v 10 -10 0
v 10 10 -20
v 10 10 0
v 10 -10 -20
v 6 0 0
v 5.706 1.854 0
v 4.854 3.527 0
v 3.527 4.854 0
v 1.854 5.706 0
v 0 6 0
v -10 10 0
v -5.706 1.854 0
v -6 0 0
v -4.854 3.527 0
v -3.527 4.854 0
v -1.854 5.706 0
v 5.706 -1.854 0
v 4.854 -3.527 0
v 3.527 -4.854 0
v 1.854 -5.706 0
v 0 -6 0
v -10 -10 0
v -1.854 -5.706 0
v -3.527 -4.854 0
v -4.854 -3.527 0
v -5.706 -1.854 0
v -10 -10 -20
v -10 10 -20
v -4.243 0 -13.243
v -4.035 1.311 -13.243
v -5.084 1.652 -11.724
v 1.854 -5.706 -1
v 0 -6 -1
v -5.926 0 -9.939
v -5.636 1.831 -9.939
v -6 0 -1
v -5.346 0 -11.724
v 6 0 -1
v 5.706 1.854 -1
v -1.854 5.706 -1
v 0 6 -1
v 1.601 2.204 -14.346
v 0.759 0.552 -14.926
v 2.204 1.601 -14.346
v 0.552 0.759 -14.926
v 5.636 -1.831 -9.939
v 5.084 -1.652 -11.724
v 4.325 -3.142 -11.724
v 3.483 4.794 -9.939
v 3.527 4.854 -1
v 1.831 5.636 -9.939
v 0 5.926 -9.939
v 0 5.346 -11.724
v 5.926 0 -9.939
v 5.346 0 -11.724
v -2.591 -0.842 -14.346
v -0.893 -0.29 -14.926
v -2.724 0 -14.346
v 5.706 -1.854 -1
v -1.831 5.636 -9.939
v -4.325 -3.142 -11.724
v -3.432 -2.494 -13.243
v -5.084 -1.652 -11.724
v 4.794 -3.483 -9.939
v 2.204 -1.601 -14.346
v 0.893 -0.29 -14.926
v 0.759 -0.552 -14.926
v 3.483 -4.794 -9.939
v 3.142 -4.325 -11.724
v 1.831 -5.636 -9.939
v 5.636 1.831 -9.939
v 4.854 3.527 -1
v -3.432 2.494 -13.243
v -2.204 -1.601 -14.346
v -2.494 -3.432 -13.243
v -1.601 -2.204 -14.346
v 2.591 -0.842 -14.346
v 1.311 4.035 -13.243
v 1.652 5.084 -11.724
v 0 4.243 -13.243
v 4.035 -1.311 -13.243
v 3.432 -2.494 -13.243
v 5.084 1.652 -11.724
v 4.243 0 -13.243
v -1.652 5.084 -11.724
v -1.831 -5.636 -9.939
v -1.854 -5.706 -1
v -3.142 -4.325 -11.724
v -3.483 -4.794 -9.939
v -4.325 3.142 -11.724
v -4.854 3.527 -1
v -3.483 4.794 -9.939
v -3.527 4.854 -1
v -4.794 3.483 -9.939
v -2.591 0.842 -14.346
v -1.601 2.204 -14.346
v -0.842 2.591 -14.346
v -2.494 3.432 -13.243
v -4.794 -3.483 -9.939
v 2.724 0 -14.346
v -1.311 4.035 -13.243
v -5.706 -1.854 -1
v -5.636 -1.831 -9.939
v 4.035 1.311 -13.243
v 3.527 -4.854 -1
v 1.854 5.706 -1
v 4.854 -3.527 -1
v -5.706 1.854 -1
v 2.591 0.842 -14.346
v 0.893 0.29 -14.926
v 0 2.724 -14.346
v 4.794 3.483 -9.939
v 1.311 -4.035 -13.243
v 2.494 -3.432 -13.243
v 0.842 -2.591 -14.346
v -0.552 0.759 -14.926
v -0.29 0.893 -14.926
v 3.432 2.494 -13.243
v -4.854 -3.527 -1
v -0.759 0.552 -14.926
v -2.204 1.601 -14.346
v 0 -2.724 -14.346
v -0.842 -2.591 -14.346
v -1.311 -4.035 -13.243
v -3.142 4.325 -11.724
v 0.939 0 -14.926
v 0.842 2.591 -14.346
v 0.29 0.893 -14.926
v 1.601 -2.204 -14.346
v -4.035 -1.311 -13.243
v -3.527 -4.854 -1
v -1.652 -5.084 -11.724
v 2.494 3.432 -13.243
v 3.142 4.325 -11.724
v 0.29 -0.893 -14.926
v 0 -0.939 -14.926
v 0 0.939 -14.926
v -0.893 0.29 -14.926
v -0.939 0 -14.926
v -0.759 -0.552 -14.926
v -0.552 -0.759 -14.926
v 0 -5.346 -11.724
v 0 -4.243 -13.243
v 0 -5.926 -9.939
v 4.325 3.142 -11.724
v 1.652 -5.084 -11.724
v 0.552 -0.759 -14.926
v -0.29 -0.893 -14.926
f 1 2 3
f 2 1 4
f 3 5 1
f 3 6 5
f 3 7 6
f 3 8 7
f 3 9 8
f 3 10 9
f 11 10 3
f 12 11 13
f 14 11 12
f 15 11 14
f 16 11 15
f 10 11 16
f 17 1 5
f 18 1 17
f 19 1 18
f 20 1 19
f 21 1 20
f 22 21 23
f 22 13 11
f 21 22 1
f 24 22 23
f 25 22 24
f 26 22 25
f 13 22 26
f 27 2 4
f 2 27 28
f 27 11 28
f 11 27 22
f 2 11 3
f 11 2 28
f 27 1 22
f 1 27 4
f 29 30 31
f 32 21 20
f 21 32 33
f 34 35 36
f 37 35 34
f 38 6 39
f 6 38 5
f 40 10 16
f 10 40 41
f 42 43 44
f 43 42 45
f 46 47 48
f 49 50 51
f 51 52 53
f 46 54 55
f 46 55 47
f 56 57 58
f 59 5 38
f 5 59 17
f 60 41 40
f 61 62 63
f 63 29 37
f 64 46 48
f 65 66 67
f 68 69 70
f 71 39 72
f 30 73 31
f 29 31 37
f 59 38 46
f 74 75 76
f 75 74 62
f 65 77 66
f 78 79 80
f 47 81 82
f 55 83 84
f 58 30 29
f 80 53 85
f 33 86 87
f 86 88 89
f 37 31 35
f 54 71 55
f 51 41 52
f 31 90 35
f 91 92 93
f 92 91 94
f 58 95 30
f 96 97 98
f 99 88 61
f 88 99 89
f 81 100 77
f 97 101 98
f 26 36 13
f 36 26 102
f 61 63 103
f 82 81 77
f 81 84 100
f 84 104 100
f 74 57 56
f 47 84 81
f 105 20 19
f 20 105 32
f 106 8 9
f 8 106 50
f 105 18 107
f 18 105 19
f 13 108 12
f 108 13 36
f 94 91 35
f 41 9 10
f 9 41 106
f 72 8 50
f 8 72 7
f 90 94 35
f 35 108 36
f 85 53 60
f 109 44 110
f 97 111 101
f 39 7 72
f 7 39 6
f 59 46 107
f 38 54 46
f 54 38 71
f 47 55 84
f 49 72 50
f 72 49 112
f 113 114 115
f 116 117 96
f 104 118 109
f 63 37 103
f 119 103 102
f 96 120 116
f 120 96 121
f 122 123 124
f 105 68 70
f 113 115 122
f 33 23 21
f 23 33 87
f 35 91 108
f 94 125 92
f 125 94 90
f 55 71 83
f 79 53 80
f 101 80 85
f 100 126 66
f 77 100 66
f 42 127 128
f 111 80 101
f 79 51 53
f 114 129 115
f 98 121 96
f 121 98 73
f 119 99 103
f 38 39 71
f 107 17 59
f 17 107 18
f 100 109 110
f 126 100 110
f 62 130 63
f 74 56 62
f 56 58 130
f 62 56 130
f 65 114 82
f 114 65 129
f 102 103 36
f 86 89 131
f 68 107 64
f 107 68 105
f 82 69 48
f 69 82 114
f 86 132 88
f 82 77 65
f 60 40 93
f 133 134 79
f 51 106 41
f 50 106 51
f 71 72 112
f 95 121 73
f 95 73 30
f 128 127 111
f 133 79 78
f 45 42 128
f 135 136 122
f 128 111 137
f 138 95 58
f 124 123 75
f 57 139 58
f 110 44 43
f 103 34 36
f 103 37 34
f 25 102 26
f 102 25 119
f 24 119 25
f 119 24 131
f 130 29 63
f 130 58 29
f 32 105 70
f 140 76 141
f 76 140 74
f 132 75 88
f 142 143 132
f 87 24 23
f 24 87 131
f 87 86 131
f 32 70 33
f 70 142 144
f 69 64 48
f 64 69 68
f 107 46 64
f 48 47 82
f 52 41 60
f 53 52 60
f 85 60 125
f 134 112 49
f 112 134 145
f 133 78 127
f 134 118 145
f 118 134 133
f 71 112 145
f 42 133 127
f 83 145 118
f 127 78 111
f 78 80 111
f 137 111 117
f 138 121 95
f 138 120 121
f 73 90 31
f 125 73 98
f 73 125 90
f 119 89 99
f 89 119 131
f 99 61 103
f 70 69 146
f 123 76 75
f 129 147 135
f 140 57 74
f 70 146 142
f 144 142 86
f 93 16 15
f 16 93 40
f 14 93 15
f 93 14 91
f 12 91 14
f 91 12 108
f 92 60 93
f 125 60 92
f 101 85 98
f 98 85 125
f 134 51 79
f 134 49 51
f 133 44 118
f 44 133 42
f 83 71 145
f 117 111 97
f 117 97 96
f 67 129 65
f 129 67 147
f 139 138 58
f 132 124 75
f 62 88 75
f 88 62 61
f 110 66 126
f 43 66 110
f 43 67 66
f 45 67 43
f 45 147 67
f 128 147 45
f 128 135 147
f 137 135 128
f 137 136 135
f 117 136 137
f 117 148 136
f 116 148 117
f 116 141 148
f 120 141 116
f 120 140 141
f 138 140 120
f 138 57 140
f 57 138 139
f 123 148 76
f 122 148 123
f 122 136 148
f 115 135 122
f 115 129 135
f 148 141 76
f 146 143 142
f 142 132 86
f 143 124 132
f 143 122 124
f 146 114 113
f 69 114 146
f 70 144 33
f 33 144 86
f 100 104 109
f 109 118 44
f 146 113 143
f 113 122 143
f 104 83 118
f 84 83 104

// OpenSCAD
// file: mold.scad
module mold() {
  difference() {
    color("Orange") translate([0,0,-10]) cube(size=[20, 20, 20], center=true);
    hull() {
      translate([0,0,-9]) sphere(r=6);
      cylinder(r=6, h=2, center=true);
    }
  }
}
// file: head.scad
$fn=20;

stud_diam = 3.08 + (0.9 * 2);
stud_height = 2;
head_diam = 10.11;
head_height = 8.36;
neck_diam = 6.52;
neck_height = 1.21;
head_curve_radius = 1.75;


module head() {
  translate([0,0,-stud_height]) cylinder(r=stud_diam/2, h=stud_height);

  translate([0,0,-(head_curve_radius + stud_height)])
  hull() {
    rotate_extrude(convexity = 10)
    translate([(head_diam/2) - head_curve_radius, 0, 0])
    circle(r = head_curve_radius);

    translate([0,0,-(head_height - (head_curve_radius*2))])
    rotate_extrude(convexity = 10)
    translate([(head_diam/2) - head_curve_radius, 0, 0])
    circle(r = head_curve_radius);
  }

  translate([0,0,-(stud_height + head_height + neck_height)]) cylinder(r=neck_diam/2, h=neck_height);
}
// main file
include <head.scad>
include <mold.scad>

difference() {
  // union() {
  //   translate([0,0,-12]) rotate([180,0,0]) head();
    mold();
  // }
  // translate([0,15,0]) cube(size=[30, 30, 60], center=true);
}
